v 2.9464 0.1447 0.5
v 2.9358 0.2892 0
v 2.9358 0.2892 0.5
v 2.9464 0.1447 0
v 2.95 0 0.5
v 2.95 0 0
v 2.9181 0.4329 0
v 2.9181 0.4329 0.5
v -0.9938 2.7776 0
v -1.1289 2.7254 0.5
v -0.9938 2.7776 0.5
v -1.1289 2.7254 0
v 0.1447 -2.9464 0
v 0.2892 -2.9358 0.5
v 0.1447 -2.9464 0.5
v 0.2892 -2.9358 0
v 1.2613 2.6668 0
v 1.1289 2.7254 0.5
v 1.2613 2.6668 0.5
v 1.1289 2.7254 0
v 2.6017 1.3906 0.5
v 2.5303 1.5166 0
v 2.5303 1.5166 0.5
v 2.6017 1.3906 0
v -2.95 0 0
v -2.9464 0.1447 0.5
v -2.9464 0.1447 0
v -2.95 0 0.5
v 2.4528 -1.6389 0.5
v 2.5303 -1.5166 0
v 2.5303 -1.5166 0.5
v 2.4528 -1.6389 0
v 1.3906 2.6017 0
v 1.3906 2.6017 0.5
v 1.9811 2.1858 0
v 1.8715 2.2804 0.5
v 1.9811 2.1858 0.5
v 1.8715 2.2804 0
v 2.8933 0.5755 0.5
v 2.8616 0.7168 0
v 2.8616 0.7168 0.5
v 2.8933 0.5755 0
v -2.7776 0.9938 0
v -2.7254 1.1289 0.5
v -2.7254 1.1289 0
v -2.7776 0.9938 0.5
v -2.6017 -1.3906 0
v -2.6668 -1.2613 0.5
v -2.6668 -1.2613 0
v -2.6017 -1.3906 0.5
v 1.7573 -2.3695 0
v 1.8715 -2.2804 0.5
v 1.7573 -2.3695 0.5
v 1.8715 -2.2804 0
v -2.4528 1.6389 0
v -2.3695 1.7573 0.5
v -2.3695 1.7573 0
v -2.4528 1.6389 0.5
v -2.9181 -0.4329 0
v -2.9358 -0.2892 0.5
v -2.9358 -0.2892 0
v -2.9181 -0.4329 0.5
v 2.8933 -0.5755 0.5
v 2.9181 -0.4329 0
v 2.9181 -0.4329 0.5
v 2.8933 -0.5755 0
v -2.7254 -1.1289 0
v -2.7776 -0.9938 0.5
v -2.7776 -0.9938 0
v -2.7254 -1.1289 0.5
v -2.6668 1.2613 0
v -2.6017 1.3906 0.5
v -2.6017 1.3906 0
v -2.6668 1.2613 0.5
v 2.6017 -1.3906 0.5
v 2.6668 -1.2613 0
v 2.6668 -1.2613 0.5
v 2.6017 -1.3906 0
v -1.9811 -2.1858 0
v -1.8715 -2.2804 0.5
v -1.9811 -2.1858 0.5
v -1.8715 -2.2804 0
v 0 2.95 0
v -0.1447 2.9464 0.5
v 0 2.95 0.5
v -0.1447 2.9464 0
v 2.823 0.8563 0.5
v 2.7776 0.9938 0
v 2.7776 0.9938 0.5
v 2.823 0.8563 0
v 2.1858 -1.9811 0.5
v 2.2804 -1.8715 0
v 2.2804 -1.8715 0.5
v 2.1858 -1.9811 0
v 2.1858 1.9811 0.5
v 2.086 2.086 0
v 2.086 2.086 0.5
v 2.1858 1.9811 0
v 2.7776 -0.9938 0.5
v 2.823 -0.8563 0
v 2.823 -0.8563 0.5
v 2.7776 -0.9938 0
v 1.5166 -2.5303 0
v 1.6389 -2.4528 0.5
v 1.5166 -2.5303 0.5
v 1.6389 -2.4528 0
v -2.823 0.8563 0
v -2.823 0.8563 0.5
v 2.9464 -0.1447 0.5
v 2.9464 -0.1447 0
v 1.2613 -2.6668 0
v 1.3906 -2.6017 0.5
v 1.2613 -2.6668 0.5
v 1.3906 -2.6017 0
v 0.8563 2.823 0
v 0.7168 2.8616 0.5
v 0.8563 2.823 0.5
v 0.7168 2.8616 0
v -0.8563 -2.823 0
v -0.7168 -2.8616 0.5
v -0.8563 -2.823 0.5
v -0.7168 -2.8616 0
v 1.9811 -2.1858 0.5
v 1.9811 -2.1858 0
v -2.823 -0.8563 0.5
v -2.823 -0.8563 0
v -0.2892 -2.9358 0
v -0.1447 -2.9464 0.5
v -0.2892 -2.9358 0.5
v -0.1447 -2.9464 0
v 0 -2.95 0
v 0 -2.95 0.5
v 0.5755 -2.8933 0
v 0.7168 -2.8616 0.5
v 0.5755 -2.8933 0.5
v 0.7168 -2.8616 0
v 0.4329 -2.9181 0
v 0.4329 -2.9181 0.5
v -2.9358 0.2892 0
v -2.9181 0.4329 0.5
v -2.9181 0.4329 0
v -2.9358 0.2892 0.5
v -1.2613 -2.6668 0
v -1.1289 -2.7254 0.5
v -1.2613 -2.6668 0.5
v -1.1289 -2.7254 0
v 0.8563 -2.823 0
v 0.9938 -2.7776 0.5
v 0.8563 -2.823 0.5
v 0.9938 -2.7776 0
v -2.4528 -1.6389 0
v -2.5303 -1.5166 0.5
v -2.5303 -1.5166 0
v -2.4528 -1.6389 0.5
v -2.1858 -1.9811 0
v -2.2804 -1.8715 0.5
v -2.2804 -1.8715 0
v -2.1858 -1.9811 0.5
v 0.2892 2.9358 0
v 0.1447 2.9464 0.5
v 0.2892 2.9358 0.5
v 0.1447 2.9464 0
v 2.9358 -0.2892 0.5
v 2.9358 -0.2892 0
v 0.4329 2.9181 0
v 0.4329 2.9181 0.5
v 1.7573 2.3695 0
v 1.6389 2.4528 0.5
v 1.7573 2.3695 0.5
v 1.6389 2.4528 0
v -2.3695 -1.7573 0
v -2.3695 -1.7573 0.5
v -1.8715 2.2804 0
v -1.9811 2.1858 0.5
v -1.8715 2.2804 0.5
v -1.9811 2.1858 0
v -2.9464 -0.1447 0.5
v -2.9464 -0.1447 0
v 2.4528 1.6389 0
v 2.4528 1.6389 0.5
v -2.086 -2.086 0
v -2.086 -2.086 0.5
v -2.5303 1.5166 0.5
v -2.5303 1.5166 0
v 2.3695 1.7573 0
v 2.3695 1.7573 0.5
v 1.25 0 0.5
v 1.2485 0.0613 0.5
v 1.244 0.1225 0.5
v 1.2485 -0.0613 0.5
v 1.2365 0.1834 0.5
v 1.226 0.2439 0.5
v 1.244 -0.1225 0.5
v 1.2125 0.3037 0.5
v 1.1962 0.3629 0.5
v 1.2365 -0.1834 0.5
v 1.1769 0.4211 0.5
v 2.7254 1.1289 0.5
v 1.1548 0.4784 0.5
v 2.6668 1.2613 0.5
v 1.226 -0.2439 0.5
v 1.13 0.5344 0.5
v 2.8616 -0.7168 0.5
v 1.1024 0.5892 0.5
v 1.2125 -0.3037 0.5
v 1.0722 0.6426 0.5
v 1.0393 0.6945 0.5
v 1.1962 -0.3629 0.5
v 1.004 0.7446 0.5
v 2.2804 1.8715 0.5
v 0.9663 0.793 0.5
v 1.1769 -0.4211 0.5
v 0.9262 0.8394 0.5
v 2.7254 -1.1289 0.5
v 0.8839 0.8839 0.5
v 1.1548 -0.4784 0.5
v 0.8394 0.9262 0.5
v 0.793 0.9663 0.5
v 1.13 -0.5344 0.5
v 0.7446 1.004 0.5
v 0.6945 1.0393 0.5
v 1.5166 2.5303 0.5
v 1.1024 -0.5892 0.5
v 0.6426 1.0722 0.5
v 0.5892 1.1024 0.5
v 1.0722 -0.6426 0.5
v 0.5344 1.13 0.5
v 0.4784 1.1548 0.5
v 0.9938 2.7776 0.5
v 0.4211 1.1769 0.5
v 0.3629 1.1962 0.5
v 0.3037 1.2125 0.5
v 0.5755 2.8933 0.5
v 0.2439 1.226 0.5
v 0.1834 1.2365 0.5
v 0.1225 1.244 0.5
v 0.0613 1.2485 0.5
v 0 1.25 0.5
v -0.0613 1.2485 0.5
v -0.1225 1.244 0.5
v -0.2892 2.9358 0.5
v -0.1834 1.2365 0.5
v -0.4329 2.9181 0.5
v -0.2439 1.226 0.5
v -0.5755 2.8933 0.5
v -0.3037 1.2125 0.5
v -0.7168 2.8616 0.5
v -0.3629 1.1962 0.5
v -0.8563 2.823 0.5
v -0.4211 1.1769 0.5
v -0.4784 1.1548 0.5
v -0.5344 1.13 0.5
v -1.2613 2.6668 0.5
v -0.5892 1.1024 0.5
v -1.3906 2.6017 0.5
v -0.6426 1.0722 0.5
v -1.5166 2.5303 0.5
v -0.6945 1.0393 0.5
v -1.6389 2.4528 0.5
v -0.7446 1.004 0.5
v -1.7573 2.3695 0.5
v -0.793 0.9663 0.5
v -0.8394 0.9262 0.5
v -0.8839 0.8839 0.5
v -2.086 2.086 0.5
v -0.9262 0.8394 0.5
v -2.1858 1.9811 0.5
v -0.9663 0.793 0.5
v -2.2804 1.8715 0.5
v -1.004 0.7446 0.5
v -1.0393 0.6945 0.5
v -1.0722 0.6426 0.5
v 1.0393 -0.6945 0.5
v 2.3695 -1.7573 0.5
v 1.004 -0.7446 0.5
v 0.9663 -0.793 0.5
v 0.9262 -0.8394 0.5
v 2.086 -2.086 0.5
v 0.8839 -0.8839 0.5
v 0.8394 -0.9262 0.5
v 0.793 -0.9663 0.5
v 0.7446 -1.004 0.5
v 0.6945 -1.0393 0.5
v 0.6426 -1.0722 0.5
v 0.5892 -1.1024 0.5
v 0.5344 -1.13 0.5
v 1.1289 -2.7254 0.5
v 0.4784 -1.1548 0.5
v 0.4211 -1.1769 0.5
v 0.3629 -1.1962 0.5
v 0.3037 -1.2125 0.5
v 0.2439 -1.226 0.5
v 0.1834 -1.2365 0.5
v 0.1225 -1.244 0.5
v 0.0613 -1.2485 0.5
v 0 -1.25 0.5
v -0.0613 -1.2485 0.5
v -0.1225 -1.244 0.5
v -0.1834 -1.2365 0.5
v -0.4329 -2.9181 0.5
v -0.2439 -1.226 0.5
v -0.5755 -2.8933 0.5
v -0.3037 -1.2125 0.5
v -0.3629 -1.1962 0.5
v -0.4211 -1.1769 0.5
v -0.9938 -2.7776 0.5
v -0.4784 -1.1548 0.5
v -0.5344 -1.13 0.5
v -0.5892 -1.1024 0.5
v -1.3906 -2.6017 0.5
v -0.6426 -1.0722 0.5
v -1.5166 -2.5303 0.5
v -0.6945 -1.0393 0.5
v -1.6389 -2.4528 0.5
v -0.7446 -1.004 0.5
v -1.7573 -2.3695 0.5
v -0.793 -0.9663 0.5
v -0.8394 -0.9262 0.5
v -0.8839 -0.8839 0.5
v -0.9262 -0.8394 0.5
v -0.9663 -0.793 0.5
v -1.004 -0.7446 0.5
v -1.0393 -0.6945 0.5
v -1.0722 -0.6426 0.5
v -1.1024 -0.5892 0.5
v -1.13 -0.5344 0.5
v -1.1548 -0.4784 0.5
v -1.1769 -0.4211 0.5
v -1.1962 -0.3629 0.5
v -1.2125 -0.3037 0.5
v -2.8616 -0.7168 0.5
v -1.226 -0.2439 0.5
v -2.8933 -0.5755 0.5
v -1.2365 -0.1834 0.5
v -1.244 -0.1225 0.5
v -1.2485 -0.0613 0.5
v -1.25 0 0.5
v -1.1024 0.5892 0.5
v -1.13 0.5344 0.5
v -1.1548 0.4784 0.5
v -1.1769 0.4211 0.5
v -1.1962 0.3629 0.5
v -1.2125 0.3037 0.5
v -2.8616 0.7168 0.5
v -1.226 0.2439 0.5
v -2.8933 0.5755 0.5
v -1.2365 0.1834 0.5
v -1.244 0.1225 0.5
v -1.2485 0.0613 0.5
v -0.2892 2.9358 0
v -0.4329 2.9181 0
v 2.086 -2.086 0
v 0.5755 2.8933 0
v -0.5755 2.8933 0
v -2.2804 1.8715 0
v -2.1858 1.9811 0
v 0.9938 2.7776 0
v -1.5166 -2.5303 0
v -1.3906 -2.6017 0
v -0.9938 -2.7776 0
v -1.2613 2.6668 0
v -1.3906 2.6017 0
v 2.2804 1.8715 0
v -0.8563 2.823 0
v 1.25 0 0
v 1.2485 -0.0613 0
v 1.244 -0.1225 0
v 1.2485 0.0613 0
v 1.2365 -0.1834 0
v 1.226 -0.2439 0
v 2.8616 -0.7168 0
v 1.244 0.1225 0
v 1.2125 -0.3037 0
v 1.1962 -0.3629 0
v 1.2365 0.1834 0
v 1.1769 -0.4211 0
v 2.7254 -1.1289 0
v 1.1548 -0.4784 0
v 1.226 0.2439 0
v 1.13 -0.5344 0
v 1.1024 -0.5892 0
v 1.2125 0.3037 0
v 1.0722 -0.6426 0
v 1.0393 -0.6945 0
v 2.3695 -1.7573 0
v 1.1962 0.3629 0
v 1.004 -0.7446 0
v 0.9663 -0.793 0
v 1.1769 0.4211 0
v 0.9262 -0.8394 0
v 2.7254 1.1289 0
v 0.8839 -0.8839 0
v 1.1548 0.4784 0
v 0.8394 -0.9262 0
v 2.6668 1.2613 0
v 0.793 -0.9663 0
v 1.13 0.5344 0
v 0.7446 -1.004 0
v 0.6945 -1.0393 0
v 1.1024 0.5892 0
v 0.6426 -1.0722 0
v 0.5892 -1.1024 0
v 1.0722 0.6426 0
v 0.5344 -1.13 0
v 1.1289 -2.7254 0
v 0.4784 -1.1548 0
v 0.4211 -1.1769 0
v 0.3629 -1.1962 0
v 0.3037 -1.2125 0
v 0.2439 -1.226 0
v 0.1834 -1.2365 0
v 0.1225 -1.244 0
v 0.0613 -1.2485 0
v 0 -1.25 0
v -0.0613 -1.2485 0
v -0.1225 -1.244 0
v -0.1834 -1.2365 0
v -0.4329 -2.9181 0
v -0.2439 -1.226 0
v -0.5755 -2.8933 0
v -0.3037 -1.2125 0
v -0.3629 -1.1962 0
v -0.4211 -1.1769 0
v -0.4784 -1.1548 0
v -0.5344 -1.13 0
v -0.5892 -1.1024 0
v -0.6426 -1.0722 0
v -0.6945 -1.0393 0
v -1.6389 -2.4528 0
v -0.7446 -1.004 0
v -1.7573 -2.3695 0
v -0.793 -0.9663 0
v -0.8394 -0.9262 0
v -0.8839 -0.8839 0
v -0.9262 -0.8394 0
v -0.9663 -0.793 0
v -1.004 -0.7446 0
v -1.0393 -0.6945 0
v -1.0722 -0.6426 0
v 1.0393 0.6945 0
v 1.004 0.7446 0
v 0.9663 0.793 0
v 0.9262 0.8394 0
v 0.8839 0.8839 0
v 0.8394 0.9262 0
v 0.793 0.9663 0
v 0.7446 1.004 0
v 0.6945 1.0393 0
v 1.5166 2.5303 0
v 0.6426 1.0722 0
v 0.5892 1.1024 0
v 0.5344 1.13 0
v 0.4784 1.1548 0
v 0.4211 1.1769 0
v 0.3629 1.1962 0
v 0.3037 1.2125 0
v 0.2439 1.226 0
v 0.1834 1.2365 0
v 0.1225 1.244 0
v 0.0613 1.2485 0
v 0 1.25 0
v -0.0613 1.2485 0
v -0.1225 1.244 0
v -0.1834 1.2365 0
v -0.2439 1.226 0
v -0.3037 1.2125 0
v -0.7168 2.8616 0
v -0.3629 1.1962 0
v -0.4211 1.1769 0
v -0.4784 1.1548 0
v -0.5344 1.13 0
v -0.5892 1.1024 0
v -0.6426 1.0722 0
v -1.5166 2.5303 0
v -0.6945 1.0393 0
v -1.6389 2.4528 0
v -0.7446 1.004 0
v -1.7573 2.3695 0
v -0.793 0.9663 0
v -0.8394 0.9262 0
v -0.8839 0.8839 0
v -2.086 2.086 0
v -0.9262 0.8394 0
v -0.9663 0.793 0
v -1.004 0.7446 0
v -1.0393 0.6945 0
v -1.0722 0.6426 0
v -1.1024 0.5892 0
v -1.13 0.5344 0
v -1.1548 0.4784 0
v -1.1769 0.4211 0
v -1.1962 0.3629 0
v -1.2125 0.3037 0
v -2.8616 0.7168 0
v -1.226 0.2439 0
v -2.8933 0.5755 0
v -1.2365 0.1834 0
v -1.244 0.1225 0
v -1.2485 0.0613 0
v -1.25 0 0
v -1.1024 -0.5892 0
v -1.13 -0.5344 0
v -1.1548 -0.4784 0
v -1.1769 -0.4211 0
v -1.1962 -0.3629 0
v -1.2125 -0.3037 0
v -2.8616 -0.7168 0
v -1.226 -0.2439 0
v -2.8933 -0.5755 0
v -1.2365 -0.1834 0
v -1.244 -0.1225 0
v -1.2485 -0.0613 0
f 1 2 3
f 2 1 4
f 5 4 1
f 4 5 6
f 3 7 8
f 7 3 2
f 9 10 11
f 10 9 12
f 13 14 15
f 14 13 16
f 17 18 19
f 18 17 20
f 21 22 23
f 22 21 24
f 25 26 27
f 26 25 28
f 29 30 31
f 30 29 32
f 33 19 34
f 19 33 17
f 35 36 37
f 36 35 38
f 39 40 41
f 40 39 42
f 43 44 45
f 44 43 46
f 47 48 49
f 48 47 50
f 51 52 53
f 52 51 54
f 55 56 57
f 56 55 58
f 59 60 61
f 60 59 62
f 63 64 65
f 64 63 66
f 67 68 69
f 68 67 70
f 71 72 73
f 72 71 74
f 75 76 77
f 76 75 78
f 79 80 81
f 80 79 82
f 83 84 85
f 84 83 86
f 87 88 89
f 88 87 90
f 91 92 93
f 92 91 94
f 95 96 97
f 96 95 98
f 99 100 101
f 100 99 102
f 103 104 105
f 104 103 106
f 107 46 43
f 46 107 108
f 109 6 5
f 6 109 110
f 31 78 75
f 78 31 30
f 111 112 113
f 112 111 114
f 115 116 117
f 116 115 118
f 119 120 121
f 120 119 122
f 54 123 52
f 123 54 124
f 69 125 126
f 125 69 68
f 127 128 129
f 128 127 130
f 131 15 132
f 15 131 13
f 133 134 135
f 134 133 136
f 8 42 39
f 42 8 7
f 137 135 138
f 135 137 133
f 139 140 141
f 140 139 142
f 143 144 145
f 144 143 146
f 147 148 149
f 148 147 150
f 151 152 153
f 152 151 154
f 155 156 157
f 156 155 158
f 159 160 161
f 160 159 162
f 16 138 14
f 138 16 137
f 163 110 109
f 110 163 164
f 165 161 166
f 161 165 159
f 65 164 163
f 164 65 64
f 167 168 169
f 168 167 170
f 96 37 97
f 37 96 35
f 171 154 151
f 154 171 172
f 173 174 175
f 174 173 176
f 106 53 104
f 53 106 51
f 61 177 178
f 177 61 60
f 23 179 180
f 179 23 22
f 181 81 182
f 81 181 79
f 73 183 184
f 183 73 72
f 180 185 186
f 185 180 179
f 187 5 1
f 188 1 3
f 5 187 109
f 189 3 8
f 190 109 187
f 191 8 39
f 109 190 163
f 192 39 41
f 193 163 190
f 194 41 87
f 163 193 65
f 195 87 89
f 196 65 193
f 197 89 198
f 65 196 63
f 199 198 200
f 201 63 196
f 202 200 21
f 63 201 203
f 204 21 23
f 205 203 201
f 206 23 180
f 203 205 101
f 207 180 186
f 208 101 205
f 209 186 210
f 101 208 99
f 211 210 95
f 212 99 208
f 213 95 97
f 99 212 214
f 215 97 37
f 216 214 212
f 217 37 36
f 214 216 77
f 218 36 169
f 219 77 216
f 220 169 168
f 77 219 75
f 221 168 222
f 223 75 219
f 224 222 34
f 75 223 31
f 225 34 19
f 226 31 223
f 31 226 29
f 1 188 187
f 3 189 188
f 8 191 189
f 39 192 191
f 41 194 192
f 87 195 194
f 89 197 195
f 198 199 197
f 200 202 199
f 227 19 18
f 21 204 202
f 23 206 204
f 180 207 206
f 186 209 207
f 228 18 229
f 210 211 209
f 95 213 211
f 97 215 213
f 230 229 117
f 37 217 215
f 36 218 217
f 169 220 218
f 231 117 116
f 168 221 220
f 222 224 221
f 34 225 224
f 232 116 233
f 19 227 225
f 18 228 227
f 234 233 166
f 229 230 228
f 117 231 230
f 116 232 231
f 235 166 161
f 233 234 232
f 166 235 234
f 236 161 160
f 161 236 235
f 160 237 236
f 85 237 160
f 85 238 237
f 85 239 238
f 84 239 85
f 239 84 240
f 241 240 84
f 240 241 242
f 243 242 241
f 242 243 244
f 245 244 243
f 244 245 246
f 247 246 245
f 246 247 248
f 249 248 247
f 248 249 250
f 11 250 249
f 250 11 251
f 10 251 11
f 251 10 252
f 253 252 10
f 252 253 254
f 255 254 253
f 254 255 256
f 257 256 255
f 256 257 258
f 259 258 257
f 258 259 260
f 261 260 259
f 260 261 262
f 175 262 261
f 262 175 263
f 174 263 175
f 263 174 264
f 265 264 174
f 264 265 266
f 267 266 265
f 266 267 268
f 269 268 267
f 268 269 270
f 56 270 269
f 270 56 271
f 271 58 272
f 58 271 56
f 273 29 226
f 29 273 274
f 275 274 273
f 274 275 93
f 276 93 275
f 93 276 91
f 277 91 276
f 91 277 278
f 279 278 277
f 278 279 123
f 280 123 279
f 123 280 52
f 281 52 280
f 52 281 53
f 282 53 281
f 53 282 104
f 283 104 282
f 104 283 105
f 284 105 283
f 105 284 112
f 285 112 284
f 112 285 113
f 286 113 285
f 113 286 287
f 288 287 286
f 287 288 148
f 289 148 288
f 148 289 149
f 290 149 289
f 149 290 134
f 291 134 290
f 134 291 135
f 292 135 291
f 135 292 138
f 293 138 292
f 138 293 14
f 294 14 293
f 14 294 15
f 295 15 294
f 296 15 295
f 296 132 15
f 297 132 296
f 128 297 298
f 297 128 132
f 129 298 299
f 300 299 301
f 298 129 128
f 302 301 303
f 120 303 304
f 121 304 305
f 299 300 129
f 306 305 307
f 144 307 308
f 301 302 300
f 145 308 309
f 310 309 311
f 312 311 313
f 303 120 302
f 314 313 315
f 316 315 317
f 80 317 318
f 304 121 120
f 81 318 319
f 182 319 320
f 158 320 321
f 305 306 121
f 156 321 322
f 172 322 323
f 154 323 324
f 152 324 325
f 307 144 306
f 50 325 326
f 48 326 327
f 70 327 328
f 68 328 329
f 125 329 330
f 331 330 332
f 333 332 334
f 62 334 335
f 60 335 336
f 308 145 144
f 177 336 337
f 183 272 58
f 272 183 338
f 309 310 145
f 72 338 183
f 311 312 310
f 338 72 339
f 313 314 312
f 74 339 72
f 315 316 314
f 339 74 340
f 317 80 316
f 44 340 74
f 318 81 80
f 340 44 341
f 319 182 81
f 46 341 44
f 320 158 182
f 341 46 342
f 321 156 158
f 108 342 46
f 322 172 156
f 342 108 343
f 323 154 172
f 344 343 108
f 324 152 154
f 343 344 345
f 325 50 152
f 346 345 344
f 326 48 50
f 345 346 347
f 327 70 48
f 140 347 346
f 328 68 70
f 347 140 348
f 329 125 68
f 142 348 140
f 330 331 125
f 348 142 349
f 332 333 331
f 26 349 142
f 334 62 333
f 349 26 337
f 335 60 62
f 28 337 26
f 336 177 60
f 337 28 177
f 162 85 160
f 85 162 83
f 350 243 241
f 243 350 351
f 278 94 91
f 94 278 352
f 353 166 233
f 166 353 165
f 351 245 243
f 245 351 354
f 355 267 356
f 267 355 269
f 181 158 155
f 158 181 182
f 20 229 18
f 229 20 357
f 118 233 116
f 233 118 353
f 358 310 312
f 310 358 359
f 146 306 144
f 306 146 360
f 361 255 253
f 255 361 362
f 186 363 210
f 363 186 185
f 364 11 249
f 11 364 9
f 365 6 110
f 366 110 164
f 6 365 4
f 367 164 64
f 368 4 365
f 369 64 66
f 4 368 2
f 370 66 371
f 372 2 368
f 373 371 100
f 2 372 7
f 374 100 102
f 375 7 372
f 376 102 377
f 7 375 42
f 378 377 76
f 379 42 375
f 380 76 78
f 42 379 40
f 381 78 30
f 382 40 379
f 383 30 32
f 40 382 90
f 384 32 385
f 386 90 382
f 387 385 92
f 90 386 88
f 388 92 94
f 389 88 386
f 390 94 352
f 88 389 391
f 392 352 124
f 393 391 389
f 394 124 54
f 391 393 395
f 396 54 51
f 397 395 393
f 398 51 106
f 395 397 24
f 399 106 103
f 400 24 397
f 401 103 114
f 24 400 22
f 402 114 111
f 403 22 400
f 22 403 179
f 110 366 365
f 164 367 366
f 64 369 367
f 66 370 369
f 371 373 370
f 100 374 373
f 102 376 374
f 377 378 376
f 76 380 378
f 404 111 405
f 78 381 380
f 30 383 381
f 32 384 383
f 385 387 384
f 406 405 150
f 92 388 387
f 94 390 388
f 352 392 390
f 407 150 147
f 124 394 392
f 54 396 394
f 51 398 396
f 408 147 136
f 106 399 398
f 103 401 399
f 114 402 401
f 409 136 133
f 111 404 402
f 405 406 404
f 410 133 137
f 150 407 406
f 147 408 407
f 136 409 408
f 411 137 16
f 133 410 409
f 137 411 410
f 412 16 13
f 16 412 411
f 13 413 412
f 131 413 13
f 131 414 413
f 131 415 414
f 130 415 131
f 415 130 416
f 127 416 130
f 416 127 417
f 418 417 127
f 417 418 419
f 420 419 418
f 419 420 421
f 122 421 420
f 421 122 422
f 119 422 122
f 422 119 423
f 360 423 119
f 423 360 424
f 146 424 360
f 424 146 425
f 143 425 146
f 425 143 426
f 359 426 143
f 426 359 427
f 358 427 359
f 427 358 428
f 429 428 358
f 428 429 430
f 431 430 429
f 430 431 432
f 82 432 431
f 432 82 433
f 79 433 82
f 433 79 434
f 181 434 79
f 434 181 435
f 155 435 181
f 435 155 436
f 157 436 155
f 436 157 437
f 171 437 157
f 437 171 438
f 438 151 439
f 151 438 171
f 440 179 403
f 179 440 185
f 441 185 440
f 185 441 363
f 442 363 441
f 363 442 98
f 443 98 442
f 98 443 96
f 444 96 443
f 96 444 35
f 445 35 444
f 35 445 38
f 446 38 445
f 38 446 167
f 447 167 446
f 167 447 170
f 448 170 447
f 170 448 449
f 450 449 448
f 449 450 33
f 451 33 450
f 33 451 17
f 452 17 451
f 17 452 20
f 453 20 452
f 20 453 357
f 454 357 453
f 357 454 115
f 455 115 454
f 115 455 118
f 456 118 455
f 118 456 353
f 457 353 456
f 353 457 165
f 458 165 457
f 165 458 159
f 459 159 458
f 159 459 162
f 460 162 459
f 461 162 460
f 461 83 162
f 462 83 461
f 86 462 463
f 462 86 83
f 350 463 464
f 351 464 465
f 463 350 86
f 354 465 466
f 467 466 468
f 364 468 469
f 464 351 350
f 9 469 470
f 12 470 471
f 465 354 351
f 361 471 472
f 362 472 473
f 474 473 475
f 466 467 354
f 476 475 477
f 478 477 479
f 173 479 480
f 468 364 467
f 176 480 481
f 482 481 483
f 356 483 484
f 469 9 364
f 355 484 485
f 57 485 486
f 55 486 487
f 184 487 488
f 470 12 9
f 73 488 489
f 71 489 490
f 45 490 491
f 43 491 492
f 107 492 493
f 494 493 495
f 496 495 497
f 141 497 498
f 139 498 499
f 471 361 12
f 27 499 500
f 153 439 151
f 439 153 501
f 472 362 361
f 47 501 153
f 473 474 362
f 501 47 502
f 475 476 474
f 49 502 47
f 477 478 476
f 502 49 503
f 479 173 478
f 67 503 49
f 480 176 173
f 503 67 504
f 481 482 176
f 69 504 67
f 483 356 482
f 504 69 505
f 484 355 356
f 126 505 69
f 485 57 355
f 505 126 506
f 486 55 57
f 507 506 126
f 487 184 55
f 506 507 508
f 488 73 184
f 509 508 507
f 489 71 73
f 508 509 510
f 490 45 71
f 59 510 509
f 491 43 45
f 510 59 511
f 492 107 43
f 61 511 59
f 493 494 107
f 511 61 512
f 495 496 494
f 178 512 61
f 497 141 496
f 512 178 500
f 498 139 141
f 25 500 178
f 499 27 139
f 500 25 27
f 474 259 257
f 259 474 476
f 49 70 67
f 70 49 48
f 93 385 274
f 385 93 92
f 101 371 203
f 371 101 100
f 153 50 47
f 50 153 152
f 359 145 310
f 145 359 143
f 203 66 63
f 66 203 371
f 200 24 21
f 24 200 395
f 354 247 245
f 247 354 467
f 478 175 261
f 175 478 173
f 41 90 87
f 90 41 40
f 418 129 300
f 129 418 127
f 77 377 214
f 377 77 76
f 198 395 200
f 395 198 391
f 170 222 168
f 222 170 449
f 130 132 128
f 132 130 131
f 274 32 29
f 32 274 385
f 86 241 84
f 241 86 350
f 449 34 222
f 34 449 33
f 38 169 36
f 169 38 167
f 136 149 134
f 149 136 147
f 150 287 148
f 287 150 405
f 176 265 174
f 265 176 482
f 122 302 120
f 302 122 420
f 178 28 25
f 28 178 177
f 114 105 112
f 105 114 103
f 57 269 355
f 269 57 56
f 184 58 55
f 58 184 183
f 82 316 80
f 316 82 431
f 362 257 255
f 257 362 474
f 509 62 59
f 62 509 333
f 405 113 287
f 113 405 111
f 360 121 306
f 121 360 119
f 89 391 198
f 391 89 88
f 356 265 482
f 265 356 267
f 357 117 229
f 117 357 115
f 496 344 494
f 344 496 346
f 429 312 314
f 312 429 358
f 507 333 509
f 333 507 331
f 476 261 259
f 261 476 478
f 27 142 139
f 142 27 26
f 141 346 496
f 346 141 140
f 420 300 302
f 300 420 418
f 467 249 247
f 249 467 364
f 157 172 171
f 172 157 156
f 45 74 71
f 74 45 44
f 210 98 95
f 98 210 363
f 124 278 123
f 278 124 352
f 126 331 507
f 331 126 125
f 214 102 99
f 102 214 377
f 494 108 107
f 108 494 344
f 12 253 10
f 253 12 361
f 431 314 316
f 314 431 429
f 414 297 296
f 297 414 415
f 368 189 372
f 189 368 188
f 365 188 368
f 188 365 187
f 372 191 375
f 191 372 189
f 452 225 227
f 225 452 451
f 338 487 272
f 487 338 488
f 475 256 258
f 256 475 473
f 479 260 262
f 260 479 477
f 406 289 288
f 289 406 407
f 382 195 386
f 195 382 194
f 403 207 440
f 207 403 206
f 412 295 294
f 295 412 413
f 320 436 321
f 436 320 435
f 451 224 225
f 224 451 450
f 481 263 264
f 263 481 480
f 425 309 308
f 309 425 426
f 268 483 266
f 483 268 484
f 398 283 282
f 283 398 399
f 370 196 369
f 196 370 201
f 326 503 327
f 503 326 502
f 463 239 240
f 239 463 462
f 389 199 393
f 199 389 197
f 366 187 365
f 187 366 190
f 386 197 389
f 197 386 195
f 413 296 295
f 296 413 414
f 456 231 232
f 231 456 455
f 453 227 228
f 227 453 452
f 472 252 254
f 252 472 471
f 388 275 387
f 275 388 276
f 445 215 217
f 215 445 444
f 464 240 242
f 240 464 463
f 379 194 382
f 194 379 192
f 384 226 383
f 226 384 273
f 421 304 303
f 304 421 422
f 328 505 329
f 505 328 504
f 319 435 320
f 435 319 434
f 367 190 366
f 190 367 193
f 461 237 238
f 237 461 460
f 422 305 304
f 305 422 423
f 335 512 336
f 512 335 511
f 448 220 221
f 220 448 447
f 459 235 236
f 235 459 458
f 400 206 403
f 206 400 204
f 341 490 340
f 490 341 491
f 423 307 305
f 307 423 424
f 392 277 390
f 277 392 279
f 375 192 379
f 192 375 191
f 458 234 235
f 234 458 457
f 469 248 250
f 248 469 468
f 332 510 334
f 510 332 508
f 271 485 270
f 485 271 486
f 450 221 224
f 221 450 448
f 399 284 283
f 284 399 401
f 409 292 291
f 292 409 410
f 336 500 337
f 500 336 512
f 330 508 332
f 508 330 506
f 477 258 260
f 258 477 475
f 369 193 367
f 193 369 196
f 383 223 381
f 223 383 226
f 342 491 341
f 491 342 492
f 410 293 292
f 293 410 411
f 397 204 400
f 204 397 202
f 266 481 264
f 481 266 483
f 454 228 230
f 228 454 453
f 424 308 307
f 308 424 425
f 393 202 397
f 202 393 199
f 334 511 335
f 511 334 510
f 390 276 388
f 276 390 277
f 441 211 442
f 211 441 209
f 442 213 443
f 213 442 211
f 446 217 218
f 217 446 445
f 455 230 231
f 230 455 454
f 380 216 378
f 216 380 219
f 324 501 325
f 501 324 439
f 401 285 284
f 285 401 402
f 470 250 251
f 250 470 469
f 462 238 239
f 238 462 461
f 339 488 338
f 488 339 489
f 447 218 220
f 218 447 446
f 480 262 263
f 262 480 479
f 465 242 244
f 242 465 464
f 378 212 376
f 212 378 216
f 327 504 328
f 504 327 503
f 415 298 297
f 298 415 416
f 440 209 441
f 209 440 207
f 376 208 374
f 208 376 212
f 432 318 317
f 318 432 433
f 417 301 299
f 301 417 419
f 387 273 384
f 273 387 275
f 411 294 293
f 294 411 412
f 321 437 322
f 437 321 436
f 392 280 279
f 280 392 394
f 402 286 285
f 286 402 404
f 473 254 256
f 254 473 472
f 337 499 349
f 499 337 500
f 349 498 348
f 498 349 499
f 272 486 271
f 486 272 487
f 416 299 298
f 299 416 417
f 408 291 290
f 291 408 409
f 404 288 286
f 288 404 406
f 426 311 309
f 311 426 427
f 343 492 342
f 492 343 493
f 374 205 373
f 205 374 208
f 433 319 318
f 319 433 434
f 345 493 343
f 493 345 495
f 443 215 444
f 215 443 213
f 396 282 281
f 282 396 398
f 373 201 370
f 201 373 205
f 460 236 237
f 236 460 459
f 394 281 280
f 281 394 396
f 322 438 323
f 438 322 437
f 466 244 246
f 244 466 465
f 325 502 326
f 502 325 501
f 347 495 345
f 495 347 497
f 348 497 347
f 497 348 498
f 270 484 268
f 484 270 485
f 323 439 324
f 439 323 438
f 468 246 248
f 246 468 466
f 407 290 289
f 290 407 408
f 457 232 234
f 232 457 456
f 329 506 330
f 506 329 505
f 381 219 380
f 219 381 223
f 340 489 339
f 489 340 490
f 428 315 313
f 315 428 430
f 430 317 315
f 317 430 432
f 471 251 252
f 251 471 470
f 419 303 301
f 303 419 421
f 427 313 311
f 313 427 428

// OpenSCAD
$fn = 128;

inner_d = 2.5;
outer_d = 5.9;
thickness = 0.5;

difference() {
  cylinder(d = outer_d, h = thickness);
  translate([0, 0, -0.1])
    cylinder(d = inner_d, h = thickness + 0.2);
}
